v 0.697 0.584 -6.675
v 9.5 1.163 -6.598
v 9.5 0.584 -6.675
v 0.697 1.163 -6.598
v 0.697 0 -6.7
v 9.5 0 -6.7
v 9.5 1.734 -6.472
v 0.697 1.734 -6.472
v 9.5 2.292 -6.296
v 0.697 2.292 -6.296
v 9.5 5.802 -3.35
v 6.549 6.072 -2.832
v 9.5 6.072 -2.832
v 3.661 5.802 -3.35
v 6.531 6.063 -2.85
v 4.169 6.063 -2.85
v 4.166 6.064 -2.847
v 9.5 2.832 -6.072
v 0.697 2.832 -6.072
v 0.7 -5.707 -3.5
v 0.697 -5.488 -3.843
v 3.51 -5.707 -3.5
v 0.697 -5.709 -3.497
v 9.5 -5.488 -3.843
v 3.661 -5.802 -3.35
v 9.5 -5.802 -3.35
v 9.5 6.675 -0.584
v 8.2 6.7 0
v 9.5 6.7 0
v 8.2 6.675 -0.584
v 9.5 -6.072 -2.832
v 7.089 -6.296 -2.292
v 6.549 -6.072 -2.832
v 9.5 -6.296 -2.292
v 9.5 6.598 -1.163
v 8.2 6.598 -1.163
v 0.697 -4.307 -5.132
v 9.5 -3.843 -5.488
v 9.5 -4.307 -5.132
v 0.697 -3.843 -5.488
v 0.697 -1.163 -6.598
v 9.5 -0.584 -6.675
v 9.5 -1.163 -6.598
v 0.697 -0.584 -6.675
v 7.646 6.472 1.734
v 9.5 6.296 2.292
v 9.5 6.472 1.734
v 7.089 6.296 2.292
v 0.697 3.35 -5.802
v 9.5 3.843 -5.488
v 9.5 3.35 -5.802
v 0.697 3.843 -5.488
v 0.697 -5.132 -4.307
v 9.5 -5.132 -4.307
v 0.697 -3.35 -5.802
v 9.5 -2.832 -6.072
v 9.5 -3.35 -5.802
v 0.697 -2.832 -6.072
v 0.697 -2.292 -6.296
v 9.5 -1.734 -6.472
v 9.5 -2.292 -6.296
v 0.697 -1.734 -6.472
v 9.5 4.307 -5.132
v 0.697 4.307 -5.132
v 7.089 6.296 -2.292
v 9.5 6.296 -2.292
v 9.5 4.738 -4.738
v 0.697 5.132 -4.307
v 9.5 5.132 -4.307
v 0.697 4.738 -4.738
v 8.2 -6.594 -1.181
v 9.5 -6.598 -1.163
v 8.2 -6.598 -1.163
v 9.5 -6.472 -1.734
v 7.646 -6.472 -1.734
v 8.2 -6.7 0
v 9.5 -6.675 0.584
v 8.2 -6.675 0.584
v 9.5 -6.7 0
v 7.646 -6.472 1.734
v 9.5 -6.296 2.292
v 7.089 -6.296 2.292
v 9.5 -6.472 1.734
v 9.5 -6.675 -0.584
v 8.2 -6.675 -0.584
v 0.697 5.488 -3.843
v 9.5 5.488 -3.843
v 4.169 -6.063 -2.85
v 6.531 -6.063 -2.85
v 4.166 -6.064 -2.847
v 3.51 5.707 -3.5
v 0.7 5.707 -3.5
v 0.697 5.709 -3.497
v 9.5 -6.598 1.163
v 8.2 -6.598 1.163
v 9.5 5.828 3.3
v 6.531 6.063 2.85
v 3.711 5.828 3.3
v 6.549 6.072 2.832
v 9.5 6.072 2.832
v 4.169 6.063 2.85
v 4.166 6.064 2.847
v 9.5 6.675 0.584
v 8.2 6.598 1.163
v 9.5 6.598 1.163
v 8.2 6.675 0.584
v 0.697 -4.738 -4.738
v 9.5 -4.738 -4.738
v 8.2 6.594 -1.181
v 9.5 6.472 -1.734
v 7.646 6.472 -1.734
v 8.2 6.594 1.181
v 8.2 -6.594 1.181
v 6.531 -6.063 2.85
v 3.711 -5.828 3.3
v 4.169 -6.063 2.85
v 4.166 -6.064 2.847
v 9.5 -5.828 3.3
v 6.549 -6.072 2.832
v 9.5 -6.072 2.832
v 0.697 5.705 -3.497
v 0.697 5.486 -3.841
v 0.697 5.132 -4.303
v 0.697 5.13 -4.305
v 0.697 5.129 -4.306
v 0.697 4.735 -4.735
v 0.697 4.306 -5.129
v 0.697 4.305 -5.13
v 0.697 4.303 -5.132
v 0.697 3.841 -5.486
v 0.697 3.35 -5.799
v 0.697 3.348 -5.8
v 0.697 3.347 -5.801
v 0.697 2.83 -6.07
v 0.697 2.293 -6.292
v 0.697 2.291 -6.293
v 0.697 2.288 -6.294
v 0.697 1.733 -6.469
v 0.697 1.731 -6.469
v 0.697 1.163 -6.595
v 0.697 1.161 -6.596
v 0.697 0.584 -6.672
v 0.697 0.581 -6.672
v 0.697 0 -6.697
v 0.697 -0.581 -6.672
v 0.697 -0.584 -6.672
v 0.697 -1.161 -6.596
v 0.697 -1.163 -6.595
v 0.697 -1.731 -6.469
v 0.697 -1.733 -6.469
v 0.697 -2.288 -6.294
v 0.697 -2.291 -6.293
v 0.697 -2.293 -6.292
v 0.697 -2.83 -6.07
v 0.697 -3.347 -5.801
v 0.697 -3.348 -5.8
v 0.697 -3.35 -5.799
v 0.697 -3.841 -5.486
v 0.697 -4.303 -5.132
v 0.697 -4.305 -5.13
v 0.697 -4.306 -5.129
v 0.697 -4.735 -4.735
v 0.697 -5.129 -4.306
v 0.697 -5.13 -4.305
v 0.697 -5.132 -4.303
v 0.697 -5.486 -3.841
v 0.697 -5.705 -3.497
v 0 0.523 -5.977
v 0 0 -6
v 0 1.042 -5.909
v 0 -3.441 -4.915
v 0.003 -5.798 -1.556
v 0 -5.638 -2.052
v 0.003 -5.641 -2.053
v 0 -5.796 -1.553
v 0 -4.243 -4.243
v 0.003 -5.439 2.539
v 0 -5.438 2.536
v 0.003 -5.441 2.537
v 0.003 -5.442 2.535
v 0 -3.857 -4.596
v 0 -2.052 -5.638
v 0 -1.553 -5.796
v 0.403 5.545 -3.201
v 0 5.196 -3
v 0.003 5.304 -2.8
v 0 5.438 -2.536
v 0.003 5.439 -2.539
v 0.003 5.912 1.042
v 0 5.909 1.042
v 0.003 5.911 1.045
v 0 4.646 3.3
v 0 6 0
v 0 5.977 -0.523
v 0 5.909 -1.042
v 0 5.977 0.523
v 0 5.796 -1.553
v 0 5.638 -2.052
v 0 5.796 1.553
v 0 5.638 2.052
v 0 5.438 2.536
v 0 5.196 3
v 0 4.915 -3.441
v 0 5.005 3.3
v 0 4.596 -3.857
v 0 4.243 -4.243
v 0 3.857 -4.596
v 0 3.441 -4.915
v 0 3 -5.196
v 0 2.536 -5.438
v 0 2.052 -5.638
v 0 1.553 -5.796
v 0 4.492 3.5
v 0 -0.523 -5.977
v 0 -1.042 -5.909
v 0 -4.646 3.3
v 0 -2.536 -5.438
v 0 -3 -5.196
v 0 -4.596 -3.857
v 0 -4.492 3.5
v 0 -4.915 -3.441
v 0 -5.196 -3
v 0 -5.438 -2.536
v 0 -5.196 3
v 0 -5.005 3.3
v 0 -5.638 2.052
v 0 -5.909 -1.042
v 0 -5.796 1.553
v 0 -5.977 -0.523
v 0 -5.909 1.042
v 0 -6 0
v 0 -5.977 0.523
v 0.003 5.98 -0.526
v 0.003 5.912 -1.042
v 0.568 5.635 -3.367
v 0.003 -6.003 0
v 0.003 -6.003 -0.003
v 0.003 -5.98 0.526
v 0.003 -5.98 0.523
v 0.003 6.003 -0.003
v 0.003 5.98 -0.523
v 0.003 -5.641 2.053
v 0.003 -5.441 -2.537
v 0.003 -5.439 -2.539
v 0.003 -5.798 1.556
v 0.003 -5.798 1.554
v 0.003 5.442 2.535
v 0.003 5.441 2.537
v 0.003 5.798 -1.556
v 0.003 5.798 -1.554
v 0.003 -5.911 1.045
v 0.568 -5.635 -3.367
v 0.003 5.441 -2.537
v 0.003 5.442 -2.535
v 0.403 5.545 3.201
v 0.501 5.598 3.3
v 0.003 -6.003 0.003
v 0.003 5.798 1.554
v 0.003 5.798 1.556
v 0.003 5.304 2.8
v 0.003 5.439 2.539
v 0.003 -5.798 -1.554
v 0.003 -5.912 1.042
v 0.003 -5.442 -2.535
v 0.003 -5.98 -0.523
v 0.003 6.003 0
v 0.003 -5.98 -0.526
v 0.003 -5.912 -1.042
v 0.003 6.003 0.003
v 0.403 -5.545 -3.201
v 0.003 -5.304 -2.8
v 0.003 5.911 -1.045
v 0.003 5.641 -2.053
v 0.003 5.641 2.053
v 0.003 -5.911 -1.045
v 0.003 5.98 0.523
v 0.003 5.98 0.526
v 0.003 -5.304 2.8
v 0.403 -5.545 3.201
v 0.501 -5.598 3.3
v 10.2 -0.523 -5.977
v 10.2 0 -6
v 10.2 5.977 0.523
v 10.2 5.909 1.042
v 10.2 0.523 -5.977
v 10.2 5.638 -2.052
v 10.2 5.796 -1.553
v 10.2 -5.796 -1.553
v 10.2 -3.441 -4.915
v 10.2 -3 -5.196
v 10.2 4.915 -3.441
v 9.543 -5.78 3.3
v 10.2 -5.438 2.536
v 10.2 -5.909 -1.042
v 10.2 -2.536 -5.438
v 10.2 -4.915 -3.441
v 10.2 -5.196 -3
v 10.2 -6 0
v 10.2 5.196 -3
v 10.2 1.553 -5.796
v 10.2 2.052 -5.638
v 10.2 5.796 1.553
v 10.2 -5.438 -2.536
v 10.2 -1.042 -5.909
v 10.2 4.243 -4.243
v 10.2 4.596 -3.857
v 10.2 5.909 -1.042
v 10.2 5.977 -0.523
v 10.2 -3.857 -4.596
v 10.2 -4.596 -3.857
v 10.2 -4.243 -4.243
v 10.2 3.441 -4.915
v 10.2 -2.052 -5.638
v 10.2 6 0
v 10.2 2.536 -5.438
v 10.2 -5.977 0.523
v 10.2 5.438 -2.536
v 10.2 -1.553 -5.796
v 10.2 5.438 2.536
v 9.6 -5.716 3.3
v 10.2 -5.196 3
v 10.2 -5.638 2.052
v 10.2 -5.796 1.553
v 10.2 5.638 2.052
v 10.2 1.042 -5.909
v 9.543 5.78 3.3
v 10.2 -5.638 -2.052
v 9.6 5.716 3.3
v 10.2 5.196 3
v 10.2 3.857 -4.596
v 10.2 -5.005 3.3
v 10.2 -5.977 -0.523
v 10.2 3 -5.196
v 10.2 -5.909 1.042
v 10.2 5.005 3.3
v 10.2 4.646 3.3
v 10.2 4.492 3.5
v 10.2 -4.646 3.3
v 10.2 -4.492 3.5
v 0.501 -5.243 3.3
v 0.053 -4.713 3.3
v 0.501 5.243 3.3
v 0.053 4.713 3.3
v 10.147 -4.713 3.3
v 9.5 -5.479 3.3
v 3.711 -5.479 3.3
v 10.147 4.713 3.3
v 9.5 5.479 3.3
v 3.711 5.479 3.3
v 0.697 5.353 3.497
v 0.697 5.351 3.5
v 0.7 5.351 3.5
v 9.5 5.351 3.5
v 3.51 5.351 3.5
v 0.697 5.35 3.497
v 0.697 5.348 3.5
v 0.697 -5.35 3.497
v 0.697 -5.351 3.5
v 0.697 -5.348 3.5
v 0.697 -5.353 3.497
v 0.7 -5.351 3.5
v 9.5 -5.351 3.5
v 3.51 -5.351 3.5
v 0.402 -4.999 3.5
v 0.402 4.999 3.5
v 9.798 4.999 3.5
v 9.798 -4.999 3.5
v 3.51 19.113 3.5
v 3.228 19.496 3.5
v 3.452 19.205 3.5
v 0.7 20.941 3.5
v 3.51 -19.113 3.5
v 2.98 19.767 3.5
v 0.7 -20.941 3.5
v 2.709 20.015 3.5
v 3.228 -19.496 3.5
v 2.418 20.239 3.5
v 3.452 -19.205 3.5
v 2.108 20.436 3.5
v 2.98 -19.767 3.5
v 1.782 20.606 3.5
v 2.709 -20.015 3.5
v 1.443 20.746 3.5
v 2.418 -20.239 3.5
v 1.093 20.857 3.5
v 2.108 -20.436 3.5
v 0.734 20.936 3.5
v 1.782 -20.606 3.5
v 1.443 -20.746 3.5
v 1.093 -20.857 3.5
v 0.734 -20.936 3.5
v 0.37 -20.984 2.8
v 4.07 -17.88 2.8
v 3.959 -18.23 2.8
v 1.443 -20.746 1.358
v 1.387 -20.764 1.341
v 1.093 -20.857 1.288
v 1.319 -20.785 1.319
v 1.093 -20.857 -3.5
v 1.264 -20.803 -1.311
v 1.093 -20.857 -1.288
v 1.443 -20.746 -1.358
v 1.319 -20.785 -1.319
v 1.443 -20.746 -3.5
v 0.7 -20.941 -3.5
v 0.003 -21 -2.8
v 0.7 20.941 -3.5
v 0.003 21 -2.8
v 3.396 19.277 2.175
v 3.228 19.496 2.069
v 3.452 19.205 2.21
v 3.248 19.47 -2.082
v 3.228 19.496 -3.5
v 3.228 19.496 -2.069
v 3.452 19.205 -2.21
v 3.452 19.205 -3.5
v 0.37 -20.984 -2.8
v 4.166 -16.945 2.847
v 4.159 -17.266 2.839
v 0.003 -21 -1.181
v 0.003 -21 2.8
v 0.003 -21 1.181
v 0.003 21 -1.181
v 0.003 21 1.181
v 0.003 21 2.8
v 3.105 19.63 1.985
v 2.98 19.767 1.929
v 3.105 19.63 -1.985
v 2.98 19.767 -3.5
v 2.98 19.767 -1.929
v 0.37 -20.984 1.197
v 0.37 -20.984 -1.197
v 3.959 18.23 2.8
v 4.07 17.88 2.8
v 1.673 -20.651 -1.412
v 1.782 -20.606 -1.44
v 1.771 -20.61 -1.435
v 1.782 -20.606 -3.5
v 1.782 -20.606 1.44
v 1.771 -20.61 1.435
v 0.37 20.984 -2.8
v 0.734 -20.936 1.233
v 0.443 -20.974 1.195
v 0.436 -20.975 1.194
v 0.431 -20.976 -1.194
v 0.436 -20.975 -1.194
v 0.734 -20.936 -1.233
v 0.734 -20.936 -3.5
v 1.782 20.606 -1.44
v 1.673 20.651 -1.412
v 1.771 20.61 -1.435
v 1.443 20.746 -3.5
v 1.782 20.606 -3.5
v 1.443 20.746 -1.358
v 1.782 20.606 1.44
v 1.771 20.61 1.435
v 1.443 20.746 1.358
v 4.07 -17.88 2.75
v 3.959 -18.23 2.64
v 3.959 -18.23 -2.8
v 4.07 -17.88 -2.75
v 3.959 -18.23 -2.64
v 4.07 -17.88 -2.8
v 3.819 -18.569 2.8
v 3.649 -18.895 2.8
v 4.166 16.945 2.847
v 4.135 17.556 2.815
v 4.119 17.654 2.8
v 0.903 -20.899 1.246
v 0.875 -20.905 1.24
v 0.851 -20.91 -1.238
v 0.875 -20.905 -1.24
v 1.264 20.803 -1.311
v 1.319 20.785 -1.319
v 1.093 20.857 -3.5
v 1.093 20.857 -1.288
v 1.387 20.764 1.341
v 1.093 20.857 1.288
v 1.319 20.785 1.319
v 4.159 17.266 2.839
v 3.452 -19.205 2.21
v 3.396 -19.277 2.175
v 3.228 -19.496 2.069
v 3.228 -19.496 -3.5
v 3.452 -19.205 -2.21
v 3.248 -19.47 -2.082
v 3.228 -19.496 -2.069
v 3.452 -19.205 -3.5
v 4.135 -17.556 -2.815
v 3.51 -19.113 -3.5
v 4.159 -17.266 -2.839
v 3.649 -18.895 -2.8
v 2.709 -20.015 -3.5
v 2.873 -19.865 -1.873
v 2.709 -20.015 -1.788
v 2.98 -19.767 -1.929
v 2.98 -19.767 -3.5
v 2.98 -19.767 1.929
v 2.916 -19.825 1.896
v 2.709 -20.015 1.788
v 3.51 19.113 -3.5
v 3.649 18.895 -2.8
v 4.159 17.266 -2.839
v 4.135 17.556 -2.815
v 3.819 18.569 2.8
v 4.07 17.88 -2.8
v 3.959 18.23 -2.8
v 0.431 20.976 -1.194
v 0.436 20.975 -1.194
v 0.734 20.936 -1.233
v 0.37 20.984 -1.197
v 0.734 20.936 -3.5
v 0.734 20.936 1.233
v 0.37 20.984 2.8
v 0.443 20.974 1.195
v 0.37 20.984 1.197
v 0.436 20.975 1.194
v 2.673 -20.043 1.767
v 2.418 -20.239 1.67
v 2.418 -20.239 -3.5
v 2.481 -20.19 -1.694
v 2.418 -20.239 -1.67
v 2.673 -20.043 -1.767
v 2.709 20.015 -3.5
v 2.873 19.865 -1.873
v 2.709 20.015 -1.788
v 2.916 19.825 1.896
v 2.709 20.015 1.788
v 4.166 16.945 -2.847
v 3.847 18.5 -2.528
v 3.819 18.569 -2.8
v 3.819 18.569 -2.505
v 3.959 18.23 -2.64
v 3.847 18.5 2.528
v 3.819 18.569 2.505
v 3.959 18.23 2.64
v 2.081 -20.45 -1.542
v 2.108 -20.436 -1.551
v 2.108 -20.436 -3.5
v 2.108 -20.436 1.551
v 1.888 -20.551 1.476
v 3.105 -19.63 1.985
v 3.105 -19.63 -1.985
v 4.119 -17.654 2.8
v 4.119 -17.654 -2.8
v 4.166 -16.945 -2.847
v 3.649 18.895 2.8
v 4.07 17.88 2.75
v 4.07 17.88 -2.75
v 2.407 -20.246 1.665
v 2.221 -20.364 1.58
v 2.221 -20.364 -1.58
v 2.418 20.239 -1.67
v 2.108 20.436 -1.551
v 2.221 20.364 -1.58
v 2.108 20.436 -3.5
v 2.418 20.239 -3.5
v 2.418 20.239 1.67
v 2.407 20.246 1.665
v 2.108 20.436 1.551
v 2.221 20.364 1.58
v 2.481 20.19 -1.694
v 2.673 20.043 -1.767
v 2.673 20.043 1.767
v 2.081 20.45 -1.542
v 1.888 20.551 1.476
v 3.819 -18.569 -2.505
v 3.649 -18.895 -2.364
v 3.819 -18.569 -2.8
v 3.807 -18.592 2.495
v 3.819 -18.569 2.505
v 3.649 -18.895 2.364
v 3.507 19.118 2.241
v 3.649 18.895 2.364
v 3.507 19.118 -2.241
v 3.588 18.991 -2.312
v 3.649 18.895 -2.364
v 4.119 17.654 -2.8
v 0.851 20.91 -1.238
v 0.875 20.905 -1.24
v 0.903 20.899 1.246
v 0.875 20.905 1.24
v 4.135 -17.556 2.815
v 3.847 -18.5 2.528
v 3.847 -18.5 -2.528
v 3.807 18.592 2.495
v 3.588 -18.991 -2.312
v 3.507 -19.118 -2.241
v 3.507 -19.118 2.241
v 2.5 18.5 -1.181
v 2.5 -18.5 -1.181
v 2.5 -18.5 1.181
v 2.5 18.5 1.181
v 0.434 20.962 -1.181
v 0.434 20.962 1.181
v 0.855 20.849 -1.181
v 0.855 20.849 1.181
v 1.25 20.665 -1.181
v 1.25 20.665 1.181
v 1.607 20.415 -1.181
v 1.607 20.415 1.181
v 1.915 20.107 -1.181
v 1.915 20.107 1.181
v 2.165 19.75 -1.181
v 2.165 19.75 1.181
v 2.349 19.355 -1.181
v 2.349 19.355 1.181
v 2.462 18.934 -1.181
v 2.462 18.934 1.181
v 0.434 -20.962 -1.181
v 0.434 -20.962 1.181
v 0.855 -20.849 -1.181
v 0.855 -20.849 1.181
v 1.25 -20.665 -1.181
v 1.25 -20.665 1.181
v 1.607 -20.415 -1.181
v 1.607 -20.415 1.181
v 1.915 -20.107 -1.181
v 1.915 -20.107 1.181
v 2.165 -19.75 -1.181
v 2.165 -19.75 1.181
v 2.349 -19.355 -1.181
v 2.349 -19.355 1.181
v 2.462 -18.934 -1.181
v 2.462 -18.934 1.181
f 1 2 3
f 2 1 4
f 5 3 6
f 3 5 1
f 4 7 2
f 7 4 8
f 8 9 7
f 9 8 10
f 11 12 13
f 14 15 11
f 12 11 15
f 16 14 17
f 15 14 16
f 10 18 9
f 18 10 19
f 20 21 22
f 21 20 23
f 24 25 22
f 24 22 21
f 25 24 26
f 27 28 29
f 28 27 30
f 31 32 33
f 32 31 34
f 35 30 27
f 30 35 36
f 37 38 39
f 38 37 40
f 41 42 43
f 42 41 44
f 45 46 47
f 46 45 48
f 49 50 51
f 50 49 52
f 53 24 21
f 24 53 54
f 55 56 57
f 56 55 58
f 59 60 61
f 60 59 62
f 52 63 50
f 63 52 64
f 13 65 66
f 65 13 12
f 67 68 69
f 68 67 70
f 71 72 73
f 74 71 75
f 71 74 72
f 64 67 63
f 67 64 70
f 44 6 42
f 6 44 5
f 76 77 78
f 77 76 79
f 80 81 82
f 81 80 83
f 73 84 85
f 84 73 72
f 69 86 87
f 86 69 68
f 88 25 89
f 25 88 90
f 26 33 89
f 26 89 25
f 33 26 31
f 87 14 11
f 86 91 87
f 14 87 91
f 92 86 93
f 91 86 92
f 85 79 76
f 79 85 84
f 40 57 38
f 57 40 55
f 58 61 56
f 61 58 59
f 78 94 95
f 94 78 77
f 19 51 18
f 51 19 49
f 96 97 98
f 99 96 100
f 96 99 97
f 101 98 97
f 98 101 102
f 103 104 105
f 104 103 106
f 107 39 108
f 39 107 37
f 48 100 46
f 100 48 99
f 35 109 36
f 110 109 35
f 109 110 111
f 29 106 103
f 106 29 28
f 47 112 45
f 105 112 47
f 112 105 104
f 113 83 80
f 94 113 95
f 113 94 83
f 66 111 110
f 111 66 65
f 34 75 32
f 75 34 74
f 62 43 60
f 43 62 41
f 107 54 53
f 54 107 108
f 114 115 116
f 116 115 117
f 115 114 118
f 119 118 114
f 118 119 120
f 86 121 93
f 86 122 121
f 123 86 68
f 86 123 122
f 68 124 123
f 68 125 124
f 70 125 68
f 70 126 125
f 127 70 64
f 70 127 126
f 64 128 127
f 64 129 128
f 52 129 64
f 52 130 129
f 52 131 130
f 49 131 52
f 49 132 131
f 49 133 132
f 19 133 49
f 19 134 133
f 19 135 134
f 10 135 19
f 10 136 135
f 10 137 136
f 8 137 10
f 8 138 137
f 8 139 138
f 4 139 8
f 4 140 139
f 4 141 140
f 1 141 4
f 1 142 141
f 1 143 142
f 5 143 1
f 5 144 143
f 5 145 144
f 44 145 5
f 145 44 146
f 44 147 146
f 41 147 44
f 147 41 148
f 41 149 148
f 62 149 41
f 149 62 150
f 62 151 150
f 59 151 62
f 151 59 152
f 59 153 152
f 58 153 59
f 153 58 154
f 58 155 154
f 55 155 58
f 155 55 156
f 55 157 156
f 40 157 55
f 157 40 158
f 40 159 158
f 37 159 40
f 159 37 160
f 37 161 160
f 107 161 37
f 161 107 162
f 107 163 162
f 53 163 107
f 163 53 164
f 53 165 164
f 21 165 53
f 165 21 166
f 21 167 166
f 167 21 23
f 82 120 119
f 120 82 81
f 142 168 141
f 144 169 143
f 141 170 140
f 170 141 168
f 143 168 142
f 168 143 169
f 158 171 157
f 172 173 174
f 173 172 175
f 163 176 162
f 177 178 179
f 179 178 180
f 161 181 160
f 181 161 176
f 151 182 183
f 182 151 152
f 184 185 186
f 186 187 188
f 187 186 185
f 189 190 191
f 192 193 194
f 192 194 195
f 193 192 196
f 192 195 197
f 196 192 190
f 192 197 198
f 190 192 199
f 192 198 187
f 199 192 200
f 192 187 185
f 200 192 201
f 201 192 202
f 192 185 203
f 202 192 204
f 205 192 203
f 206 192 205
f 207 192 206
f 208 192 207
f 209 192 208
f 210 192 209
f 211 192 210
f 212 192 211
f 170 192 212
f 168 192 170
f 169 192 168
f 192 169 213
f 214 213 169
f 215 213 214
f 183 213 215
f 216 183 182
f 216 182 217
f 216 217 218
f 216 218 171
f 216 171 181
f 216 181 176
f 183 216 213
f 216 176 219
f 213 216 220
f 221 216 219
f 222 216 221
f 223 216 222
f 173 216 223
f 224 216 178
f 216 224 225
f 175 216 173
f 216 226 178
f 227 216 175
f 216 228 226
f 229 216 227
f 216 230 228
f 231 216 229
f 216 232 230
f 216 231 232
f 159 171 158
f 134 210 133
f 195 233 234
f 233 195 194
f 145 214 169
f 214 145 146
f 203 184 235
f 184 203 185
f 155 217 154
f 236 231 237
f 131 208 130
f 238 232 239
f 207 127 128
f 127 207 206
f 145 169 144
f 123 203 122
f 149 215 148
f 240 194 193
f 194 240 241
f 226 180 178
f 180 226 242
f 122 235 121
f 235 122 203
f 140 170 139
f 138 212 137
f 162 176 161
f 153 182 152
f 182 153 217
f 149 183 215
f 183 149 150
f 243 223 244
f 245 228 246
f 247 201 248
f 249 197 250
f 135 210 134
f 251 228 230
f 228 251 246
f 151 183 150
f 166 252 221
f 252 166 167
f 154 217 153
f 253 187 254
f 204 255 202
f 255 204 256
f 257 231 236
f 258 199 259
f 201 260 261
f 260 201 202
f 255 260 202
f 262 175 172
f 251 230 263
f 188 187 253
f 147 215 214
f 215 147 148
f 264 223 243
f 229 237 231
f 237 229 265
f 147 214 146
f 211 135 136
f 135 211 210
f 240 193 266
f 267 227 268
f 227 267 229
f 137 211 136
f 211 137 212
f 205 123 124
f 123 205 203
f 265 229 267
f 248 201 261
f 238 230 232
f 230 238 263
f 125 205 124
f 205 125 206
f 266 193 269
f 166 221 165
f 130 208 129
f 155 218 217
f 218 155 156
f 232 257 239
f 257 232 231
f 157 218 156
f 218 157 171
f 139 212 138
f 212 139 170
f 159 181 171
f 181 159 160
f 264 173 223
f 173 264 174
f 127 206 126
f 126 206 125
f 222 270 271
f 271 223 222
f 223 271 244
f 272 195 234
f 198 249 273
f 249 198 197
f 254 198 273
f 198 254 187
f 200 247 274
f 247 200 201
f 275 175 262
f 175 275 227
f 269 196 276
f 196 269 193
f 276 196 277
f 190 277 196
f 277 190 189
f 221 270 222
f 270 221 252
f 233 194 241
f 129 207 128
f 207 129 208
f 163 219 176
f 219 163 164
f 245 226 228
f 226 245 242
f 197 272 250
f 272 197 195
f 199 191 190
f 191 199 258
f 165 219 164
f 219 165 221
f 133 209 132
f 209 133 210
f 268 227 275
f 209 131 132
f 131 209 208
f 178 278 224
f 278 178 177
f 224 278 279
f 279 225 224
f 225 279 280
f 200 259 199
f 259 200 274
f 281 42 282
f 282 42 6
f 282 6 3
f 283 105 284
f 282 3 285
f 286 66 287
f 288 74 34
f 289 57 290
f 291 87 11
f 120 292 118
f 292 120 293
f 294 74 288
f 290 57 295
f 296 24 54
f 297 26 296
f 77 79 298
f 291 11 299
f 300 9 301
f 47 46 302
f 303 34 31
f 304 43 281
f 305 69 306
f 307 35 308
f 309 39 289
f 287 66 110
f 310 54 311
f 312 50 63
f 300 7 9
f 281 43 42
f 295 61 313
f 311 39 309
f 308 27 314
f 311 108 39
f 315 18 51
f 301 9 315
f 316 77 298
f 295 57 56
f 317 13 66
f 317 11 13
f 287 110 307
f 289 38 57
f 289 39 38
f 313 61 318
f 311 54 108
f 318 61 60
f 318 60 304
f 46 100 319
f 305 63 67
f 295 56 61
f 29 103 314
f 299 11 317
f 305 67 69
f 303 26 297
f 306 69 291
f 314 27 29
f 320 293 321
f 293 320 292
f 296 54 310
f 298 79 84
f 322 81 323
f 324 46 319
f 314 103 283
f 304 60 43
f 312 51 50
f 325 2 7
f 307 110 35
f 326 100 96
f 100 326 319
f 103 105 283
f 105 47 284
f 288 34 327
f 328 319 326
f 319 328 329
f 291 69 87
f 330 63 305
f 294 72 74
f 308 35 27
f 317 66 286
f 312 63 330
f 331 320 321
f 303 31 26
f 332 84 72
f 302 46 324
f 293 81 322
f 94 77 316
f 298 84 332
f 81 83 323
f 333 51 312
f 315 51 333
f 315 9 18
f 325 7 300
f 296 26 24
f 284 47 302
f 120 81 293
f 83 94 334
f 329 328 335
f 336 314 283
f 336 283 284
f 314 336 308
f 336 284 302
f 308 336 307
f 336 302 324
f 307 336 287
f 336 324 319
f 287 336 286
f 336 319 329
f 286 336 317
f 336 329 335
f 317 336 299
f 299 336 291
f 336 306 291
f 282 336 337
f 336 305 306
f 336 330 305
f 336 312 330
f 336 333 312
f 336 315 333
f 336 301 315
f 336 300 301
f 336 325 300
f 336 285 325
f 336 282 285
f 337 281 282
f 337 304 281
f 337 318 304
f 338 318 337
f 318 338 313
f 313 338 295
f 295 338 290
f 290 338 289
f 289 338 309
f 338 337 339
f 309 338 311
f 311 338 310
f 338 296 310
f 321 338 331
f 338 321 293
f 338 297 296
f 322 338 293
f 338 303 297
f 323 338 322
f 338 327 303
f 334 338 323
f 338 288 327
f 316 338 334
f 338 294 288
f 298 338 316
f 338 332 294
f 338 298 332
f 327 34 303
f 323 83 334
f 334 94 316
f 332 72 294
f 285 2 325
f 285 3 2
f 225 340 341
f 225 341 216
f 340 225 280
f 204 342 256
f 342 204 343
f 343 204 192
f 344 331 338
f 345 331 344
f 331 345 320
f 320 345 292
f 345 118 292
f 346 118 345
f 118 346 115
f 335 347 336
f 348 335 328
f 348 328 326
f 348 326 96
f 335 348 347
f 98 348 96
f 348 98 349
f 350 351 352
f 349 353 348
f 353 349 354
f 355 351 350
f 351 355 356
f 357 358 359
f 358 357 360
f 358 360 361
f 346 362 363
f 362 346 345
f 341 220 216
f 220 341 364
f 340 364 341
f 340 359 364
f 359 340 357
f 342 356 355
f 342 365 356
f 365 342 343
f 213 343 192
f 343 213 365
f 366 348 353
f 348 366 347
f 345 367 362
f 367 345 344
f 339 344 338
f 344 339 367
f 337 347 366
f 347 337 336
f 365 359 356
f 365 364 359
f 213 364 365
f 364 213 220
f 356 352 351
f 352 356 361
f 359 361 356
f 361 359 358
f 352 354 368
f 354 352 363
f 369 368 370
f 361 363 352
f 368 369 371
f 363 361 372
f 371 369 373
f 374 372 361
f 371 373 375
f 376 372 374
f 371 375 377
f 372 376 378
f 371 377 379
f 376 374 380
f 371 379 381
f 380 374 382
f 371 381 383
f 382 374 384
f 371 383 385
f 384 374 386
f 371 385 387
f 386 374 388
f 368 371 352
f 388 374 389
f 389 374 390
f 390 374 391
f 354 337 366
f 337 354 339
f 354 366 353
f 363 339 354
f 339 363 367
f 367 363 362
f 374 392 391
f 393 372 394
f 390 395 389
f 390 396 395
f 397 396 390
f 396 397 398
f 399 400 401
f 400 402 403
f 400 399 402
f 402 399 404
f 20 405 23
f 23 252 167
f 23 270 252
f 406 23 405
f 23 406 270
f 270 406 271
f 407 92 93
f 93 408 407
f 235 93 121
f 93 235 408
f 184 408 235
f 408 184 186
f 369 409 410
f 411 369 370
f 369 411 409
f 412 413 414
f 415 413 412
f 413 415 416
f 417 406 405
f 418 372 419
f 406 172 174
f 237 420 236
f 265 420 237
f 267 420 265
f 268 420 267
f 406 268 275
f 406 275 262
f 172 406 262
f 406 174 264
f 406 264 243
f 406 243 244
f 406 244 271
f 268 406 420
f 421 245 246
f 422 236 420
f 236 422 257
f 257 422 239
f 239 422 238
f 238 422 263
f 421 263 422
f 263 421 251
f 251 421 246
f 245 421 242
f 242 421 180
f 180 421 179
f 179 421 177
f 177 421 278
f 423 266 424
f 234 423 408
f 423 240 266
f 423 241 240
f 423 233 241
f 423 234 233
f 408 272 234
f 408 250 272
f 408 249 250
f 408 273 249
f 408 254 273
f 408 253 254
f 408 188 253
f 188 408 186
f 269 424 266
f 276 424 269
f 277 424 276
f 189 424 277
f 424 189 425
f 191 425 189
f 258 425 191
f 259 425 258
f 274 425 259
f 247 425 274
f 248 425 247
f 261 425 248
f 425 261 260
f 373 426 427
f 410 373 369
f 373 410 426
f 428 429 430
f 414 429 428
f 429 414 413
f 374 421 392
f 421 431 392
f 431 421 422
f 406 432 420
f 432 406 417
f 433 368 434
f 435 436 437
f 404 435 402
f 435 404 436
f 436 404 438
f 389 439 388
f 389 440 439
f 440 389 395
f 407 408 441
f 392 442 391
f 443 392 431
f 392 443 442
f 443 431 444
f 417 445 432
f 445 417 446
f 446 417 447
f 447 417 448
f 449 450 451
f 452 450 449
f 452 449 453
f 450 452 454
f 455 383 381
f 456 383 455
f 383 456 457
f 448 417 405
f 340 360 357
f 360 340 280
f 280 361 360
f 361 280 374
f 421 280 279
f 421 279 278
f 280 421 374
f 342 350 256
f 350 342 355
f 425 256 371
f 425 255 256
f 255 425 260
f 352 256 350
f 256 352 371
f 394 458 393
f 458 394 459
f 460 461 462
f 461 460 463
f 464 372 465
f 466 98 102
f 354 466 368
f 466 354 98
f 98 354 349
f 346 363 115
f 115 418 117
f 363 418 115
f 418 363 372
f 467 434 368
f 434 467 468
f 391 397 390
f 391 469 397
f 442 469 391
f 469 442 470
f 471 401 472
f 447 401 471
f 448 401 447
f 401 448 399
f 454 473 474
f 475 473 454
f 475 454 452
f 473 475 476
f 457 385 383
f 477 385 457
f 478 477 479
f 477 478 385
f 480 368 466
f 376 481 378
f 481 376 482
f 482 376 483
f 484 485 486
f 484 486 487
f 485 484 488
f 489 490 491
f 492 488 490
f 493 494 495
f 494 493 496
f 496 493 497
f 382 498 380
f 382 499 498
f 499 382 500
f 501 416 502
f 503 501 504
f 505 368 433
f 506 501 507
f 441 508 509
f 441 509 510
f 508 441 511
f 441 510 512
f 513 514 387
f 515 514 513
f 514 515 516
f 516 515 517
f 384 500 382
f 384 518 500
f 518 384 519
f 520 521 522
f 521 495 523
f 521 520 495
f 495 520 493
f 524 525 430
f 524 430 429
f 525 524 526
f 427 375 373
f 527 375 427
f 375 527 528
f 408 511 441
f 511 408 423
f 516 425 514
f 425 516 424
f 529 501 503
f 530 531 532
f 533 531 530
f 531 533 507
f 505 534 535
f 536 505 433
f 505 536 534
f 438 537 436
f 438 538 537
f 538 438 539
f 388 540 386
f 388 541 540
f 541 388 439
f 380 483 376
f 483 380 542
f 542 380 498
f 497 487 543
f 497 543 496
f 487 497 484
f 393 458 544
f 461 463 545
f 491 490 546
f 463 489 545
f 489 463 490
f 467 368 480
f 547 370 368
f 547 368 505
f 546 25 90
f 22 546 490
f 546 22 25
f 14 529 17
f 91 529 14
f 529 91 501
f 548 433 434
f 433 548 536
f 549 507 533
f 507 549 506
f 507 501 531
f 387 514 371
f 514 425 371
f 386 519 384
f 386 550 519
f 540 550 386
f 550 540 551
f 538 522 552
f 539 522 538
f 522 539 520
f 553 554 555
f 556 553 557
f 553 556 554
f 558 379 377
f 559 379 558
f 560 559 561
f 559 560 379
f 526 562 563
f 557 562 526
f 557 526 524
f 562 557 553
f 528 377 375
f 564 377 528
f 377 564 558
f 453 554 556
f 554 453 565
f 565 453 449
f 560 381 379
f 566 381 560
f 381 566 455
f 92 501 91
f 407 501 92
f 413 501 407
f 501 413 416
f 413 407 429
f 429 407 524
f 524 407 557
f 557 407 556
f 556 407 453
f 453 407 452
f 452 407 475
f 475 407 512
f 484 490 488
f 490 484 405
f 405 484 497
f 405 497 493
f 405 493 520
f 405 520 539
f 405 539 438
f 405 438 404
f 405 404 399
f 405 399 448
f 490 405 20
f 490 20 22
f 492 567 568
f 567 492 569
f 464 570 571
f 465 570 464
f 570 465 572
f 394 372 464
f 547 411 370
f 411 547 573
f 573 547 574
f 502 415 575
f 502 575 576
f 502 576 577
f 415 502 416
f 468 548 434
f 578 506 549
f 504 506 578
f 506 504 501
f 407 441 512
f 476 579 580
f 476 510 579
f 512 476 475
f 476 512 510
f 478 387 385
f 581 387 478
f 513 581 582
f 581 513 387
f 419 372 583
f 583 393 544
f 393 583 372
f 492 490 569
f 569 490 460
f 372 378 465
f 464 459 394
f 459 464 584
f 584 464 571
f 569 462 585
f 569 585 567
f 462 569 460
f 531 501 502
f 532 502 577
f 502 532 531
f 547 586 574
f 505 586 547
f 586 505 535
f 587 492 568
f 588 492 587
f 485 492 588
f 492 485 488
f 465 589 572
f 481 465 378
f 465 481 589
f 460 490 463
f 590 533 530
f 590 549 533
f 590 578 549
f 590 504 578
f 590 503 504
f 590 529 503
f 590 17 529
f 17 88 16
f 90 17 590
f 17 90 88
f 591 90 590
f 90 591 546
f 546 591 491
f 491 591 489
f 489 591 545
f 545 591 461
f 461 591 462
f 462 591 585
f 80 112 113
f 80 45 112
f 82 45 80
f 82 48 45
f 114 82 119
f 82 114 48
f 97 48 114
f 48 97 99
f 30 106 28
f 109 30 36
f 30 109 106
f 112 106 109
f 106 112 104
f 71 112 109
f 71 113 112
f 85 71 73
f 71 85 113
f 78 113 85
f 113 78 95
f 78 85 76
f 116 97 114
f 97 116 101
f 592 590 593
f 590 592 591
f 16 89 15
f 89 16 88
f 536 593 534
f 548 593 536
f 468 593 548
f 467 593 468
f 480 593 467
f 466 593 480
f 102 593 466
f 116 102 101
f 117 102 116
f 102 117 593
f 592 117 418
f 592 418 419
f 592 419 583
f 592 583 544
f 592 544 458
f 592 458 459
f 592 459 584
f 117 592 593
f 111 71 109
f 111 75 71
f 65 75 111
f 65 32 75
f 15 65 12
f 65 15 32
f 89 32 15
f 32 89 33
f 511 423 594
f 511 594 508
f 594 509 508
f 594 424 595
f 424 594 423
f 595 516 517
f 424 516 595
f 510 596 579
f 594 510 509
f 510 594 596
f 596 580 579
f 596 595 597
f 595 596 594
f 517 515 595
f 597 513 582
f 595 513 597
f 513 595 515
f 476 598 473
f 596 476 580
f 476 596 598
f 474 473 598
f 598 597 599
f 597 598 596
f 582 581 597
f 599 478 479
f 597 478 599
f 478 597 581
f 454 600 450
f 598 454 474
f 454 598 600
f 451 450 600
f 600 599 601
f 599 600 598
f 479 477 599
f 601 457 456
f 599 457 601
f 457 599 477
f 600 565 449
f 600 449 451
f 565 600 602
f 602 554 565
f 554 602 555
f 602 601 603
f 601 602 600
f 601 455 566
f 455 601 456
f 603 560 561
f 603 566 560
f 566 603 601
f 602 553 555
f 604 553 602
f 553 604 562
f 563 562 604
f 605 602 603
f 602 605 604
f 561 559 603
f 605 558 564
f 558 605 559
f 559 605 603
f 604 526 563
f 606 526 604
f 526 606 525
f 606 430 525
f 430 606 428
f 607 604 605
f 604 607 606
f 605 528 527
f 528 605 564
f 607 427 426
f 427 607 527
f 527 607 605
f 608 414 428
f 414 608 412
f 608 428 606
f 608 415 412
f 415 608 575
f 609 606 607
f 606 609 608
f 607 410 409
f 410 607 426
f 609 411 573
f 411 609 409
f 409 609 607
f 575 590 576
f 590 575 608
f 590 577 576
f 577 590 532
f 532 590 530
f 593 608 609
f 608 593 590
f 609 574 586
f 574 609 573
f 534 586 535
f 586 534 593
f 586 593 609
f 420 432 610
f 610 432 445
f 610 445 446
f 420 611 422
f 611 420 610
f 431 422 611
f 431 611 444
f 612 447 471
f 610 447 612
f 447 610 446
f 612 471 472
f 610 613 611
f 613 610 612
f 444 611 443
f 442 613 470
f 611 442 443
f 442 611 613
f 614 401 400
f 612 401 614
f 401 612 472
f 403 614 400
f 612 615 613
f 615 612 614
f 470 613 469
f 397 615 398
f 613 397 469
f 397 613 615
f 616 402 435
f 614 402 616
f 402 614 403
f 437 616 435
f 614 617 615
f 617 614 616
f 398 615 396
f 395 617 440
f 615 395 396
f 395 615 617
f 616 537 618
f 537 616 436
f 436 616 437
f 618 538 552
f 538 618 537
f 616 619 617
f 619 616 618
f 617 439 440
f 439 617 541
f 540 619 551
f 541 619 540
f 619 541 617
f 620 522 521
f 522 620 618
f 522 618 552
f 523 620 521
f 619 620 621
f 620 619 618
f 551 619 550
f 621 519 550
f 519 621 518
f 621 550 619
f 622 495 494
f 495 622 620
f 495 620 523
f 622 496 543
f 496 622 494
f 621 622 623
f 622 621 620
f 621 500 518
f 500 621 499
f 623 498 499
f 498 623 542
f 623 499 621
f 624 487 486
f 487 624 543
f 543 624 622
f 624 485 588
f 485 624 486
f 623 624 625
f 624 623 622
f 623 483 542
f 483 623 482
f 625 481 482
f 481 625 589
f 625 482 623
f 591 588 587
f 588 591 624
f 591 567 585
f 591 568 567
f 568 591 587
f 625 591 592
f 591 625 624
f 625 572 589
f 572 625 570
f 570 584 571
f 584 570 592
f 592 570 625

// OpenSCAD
// file: ../morph.scad
// Utilities for composing smooth solids from a list of cross-sections.

// Searches over a list of key/value pairs (sorted by key), returning
// the index of the pair with the largest key less than or equal to 'target'.
function _binsearch(target, pairs) = (
  _binsearch_impl(target, pairs, 0, len(pairs))
);
function _binsearch_impl(target, pairs, lo, hi) = (
  // Base case.
  hi == lo + 1 ? lo :
  // Recursive case.
  let (mid = floor((hi + lo) / 2))
  pairs[mid][0] <= target
  ? _binsearch_impl(target, pairs, mid, hi)
  : _binsearch_impl(target, pairs, lo, mid)
);

// Filters out slices which do not affect the resulting solid.
function _filter(slices) = (
  assert(len(slices) > 0, "No slices")
  let (last = len(slices)-1)
  [
    for (i = [0 : last]) if (
      // Always keep the start and end.
      i == 0 ||
      i == last ||
      // Keep interior slices only if they are not bordered on both sides by
      // identical slices.
      slices[i-1][1] != slices[i][1] ||
      slices[i+1][1] != slices[i][1]
    ) slices[i]
  ]
);
  
// Each element of 'slices' is a pair giving a Z-coordinate and a payload
// list of values. The result is a similar list with Z-coordinates spaced
// apart by $zstep and the payload values interpolated.
function _reslice(slices) = (
  assert(len(slices) > 0, "No slices")
  let (
    last = len(slices)-1,
    minz = slices[0][0],
    maxz = slices[last][0]
  )
  [
    for (z = [minz : $zstep : maxz]) (
      // Edge cases: No interpolation.
      z == minz ? [z, slices[0][1]] :
      z == maxz ? [z, slices[last][1]] :
    
      // Load the two bounding points between which to interpolate.
      let (
        lo = _binsearch(z, slices),
    
        lower_z = slices[lo][0],
        lower_payload = slices[lo][1],
        upper_z = slices[lo+1][0],
        upper_payload = slices[lo+1][1],
    
        // Interpolation ratio.
        r = (z - lower_z) / (upper_z - lower_z)
      )
      [z, upper_payload*r + lower_payload*(1-r)]
    )
  ]
);

// Interpolates between several slices in the z dimension. Each element of
// 'slices' is a pair giving a Z-coordinate and a payload list of values.
// $zstep determines the resolution. The children are expected to be 2-D.
// They are evaluated repeatedly to produces the slices of the morphed
// solid. Each time the children are evaluated, $m will contain an interpolated
// slice.
module morph(slices) {
  layers = _filter(_reslice(slices));
    
  // We intentionally throw out the last slice. Otherwise we would extrude
  // one zstep beyond the desired dimensions.
  last = len(layers)-2;
  
  for (i = [0 : last]) {
    z = layers[i][0];
    height = layers[i+1][0] - z;
    translate([0, 0, z]) {
      // Add 1% to make sure all of the layers actually overlap.
      linear_extrude(height * 1.01) {
        $m = layers[i][1];
        children();
      }
    }
  }
}

// A utility for generating slices to be passed to morph. This allows the
// z-coordinate to be used as one of the interpolated elements.
function dupfirst(slices) = [
  for (s = slices) [s[0], s]
];
// file: ../extrude_and_chamfer.scad
// Like linear_extrude, but chamfers the bottom and/or top. Chamfering
// the bottom can counter elephant's foot.
module extrude_and_chamfer(height, bottom_chamfer=0, top_chamfer=0) {
  // Chamfered bottom.
  hull() {
    linear_extrude(0.0001)
      offset(delta=-bottom_chamfer)
        children();
    translate([0, 0, abs(bottom_chamfer)])
      linear_extrude(0.0001)
        children();
  }
  
  // Main body.
  hull() {
    translate([0, 0, abs(bottom_chamfer)])
      linear_extrude(0.0001)
        children();
    translate([0, 0, height-abs(top_chamfer)])
      linear_extrude(0.0001)
        children();
  }
  
  // Chamfered top.
  hull() {
    translate([0, 0, height-abs(top_chamfer)])
      linear_extrude(0.0001)
        children();
    translate([0, 0, height])
      linear_extrude(0.0001)
        offset(delta=-top_chamfer)
          children();
  }
}
// file: rail.scad
include <common.scad>

rail_notch_depth = 2.5;
rail_notch_length = 4;

// lug_type:
//   0 means no lug.
//   -1 means no lug and slightly recessed further.
//   1 means beveled.
//   2 means square.
module rail_2d(width, stem, lug_type) {
  translate([0, -stem/2 - 0.2, 0])
    square([width, stem - 0.4], center=true);
  
  difference() {
    hull()
      for (a = [-1, 1])
        scale([a, 1, 1])
          translate([width/2, 0, 0])
            rotate([0, 0, 45])
              square(rail_notch_depth*sqrt(2), center=true);
    
    // Square off the ends, to avoid sharp corners.
    for (a = [-1, 1])
      scale([a, 1, 1])
        translate([width/2 + rail_notch_depth, 0, 0])
          square(1, center=true);

    if (lug_type <= 0)
      translate([0, rail_notch_depth - (lug_type == -1 ? 0.4 : 0)])
        square([width+rail_notch_depth*4, rail_notch_depth*2], center=true);
  }
  
  if (lug_type == 2)
    translate([0, rail_notch_depth/2, 0])
      square([width + rail_notch_depth*2 - 1, rail_notch_depth], center=true);
}

module rail(width, length, stem, cavity=false) {
  repeats = floor(length / (2*rail_notch_length));
  
  intersection() {
    cube([width*2, width*2, length*2], center=true);
    
    for (a = [0:repeats]) {
      translate([0, 0, a*2*rail_notch_length]) {
        difference() {
          // High piece.
          translate([0, 0, cavity ? -snug/2 : 0])
            linear_extrude(rail_notch_length+eps + (cavity ? snug : 0))
              offset(cavity ? snug : 0)
                rail_2d(width, stem, cavity ? 2 : 1);

          // Chamfer edges.
          if (!cavity)
            for (z = [0, rail_notch_length])
              translate([0, rail_notch_depth, z])
                hull()
                  rotate([45, 0, 0])
                    cube(
                      [width*2, foot*sqrt(2), foot*sqrt(2)],
                      center=true
                    );
        }

        // Low piece.
        translate([0, 0, rail_notch_length])
          linear_extrude(rail_notch_length+eps)
            offset(cavity ? snug : 0)
              // When not cutting out a cavity, recess the low piece a bit
              // to make up for printing inaccuracies while bridging.
              rail_2d(width, stem, cavity ? 0 : -1);      
      }
    }
  }
}
// file: common.scad
$fa = 10;
$fs = 0.2;
eps = 0.003;
$zstep = 0.2;

// An inward chamfer sufficient to prevent elephant's foot.
foot = 0.4;

// FINDINGS FROM CLEARANCE TEST
//
// Consider a vertical hole of width X, a layer height of 0.2, and a vertical
// post.
//   * A post of diameter X will not fit in.
//   * A post of diameter X-0.1 will fit in, but is very hard to slide in or out.
//     This is probably due mostly to the transverse grain of the print.
//     It will rotate, but with some resistance.
//   * A post of diameter X-0.2 slides in and out easily. It rotates easily, but
//     still has noticeable resistance at some points.
//   * A post of diameter X-0.3 rotates freely. It also has noticeable play
//     from side to side.
//
// Clearances are expressed as the total across both sides of a joint.
tight = 0.1;  // Intended for stationary joints.
snug = 0.2;   // Moves, but with some resistance.
loose = 0.3;  // Free movement.
extra_loose = 0.4;

// A brim is a 0.2mm layer printed near an edge which is likely to warp.
// The edge should be chamfered outwards at 45 degrees. The brim should
// be placed this far from the bottom of the edge, so it barely touches
// the chamfer.
brim_offset = 0.3;

// Menards 5/8 x 2-3/4 x 0.04 WG compression spring.
spring_od = 5/8 * 25.4;
// Subtract 10 from the relaxed length so everything is slightly tensioned
// all the time.
spring_max_length = 2.75 * 25.4 - 10;
spring_min_length = 16;  // Approximate.

// Menards 1/4 inch aluminum rod.
roller_diameter = 6.7;
roller_cavity_diameter = roller_diameter + loose;

// 550 paracord. Make this wide enough to accommodate a melted end.
string_diameter = 4.5;

// Standard spring tube.
tube_id = spring_od + 0.7;

module octagon(diameter) {
  intersection_for(a = [0, 45])
    rotate([0, 0, a])
      square(diameter, center=true);
}

// A cylinder with chamfered or flared ends, useful for dealing with
// elephant's foot on pins or holes.
module flare_cylinder(height, radius, flare_top, flare_bottom) {
  translate([0, 0, abs(flare_bottom)-eps])
    cylinder(height-abs(flare_bottom)-abs(flare_top)+eps, radius, radius);

  // Bottom flare.
  linear_extrude(abs(flare_bottom), scale=radius/(radius-flare_bottom))
    circle(radius-flare_bottom);
  
  // Top flare.
  translate([0, 0, height-abs(flare_top)])
    linear_extrude(abs(flare_top), scale=(radius-flare_top)/radius)
      circle(radius);
}

// A cube with a chamfered or flared bottom end, useful for dealing
// with elephant's foot on pins or holes.
module flare_cube(dims, flare) {
  translate([0, 0, abs(flare)-eps])
    cube([dims.x, dims.y, dims.z - abs(flare) + eps]);

  translate([dims.x/2, dims.y/2, 0])
    linear_extrude(abs(flare), scale=[dims.x/(dims.x-2*flare), dims.y/(dims.y-2*flare)])
      translate([-(dims.x-2*flare)/2, -(dims.y-2*flare)/2, abs(flare)-eps])
        square([dims.x-2*flare, dims.y-2*flare]);
}

// An approximate circle which can be printed on its side.
module circle_ish(r) {
  // Safe overhang angle.
  q = 45;
  
  intersection() {
    // Add 0.2 (one print layer) in case the bridge is messy and hangs
    // down.
    square(2*r+0.2, center=true);
    hull() {
      circle(r);
      for (a = [-1, 1])
        translate([0, a*r/cos(q), 0])
          square(eps, center=true);
    }
  }
}

// Depth of the sockets used as glue aids.
socket_depth = 5;

module socket() {
  translate([-1.5, -1.5, -eps])
    flare_cube([3, 3, socket_depth], -foot);
}

module lug() {
  flare_cube([3-snug, 3-snug, 2*socket_depth-2], foot);
}

// Nerf darts are 0.50 cal.
dart_diameter = 12.7;
dart_length = 72;

module octahedron(major_radius=1) {
  // Top and bottom halves.
  for (a = [-1, 1])
    scale([1, 1, a])
      // Extrude a square into a pyramid.
      linear_extrude(major_radius, scale=0)
        rotate([0, 0, 45])
          square(sqrt(2)*major_radius, center=true);
}

module chamfered_cube(dims, chamfer=1) {
  assert(dims.x >= 2*chamfer);
  assert(dims.y >= 2*chamfer);
  assert(dims.z >= 2*chamfer);

  hull()
    for (a = [0, 1], b = [0, 1], c = [0, 1])
        translate([
          (dims.x - 2*chamfer) * a + chamfer,
          (dims.y - 2*chamfer) * b + chamfer,
          (dims.z - 2*chamfer) * c + chamfer
        ])
          octahedron(chamfer);
}
// main file
include <common.scad>
include <rail.scad>
include <../extrude_and_chamfer.scad>
include <../morph.scad>

cam_lip = 1.25;
cam_thickness = string_diameter + 2*cam_lip;
cam_cavity_diameter = cam_thickness + extra_loose;
cam_diameter = 18;
cam_length = 45;

cleat_diameter = 7;
cleat_offset = cam_diameter/2;

module cam_2d(cleat_recess=true) {
  // The back of the cam, which has a simple shape and faces away
  // from you.
  difference() {
    hull() {
      intersection() {
        for (x = [0, cam_length - cam_diameter])
          translate([x, 0, 0])
            circle(d=cam_diameter);
        translate([-cam_diameter/2, -cam_length, 0])
          square(cam_length);
      }
    }
    
    if (cleat_recess)
      // Cutout to make it easy to thread the string through the cleat.
      translate([cleat_offset, -cam_diameter/2 - cleat_diameter*0.3, 0])
        circle(d=cleat_diameter*1.2);
  }
  
  // The front of the cam, which has a gradual increase in radius (like
  // most cams).
  polygon([
    for (a = [0 : 1/40 : 1])
      (cam_diameter/2 + (1-cos(a * 90)) * (cam_length - cam_diameter))
      * [-cos(a*180), sin(a*180)]
  ]);
}

string_groove_depth = string_diameter*0.4;

module make_cam_exterior() {
  // The cam is a delicate piece; morph it with high precision.
  $zstep = 0.1;

  // Exterior, with an octagonal groove for the string.
  morph([
    [0, [foot]],
    [foot, [0]],
    [cam_lip, [0]],
    [cam_lip + string_groove_depth, [string_groove_depth]],
    [cam_thickness - cam_lip - string_groove_depth, [string_groove_depth]],
    [cam_thickness - cam_lip, [0]],
    [cam_thickness, [0]],
  ])
    offset(-$m[0])
      children();
}

module cam() {
  difference() {
    union() {
      make_cam_exterior()
        cam_2d();
    
      // Cleat.
      translate([cleat_offset, -cam_diameter/2-cleat_diameter/2, 0]) {
        make_cam_exterior()
          circle(d=cleat_diameter);
      
        // Plates joining cleat to cam.
        translate([-cleat_diameter/2, 0, 0])
          flare_cube([cleat_diameter, cleat_diameter, cam_lip], foot);
        translate([-cleat_diameter/2, 0, cam_thickness - cam_lip])
          cube([cleat_diameter, cleat_diameter, cam_lip], foot);
      }
    }
        
    // Hole for roller. Add $zstep/2 since the cam might be slightly
    // thicker than requested (due to morph).
    translate([0, 0, -eps])
      extrude_and_chamfer(cam_thickness + 2*eps + $zstep/2, -foot, -0.2)
        circle(d=roller_diameter+loose);
  }
}

// Need beefy tubes because they have fewer reinforcing struts.
tube_wall = 5;

// Extension of roller into walls at its ends.
roller_end = 3;

// Make the tubes slightly closer.
tube_nudge = 3;

limb_diameter = tube_id + 2*tube_wall;
limb_breadth = 2*tube_id + 4*tube_wall + cam_cavity_diameter + 2*roller_end - 2*tube_nudge;

roller_cavity_length = limb_breadth - 2*tube_wall;

follower_finger_width = 10;

// Ensure sufficient thickness even on the bottom, where there is a cutout for
// the follower finger.
limb_base_thickness = follower_finger_width + 2.5;

// Cross-section of the limb.
module limb_2d(
  cam_cavity=false,
  spring_cavity=false,
  roller_cavity=false,
  barrel_cavity=false
) {
  difference() {
    // Exterior.
    hull()
      for (a = [-1, 1])
        translate([a*(limb_diameter-limb_breadth)/2, 0, 0])
          circle(d=limb_diameter);
      
    if (cam_cavity) {
      square([cam_cavity_diameter, limb_diameter+2*eps], center=true);
        
      // Slightly chamfer the edge of the gap.
      translate([0, limb_diameter/2, 0])
        rotate([0, 0, 45])
          square(cam_cavity_diameter/sqrt(2)+1, center=true);
    }
    
    if (spring_cavity) {
      for (a = [-1, 1])
        translate([a*(tube_id/2 + tube_wall + cam_cavity_diameter/2 - tube_nudge), 0, 0])
          circle(d=tube_id);
    }
    
    if (roller_cavity) {
      square([roller_cavity_length, roller_cavity_diameter], center=true);
    }
    
    if (barrel_cavity) {
      square([barrel_height+tight, limb_diameter+2*eps], center=true);
    }
    
    // We always cut out a slot for the string and follower when they are in the rest
    // position. This is only on the side of the limb that faces you.
    translate([0, -limb_diameter/2, 0])
      square([cam_cavity_diameter, limb_diameter+2*eps], center=true);

    // Slightly chamfer the edge of the gap.
    translate([0, -limb_diameter/2, 0])
      rotate([0, 0, 45])
        square(cam_cavity_diameter/sqrt(2)+1, center=true);
  }
}

// With these cams we probably don't need to push the spring all 
// the way.
effective_spring_min_length = spring_min_length + 2;

// Should be wide enough to accommodate whatever bore structure we
// want.
barrel_width = 20;
barrel_height = 34;

module limb() {
  // A smooth inner tube helps accommodate the spring.
  $fa = 5;

  // How far beyond the roller does the cam extend? Add 1 for safe
  // clearance at the bottom of the limb.
  cam_overhang = 1 + (cam_diameter - roller_diameter) / 2;

  // Add a generous 10mm of extra length to make it easier to assemble.
  // In the final version we can make this shorter, but for now we 
  // want to experiment with different points on the spring's curve.
  tube_inner_length = spring_max_length + roller_diameter + 10;
  
  difference() {
    union() {
      translate([0, 0, -barrel_width/2])
        linear_extrude(limb_base_thickness + barrel_width/2)
          limb_2d();
      
      translate([0, 0, limb_base_thickness])
        linear_extrude(effective_spring_min_length - cam_overhang)
          limb_2d(spring_cavity=true);
      
      translate([0, 0, limb_base_thickness + effective_spring_min_length - cam_overhang])
        linear_extrude(cam_overhang)
          limb_2d(spring_cavity=true, cam_cavity=true);
      
      translate([0, 0, limb_base_thickness + effective_spring_min_length])
        linear_extrude(tube_inner_length - effective_spring_min_length - foot)
          limb_2d(spring_cavity=true, cam_cavity=true, roller_cavity=true);
      
      // Foot on top (bottom, when printing).
      translate([0, 0, limb_base_thickness + tube_inner_length]) {
        translate([0, 0, -foot])
          linear_extrude(foot/2)
            offset(-foot/2)
              limb_2d(spring_cavity=true, cam_cavity=true, roller_cavity=true);
        translate([0, 0, -foot/2])
          linear_extrude(foot/2)
            offset(-foot)
              limb_2d(spring_cavity=true, cam_cavity=true, roller_cavity=true);
      }
            
      // Fillet in front for a strong attachment to the barrel.
      extra_width = 12;
      fillet_width = extra_width + barrel_height;
      fillet_length = 20;
      translate([-fillet_width/2, limb_diameter/2-2, 0]) {
        hull() {
          translate([0, 0, limb_base_thickness + effective_spring_min_length - cam_overhang]) {
            translate([0, 0, -4])
              cube([fillet_width, eps, eps]);
            translate([fillet_width/2-cam_cavity_diameter/2, 2, 0])
              cube([cam_cavity_diameter, eps, eps]);
          }
          translate([0, 0, -barrel_width/2])
            cube([fillet_width, fillet_length, eps]);
          translate([0, 0, 7-barrel_width/2])
            cube([fillet_width, fillet_length, eps]);
        }
      }
    }
  
    // String channel inside the fillet.
    tunnel_id = string_diameter + 1.7;
    tunnel_curve_radius = 5;
    translate([
      0,
      tunnel_curve_radius + limb_diameter/2 - 1.5,
      limb_base_thickness + effective_spring_min_length - cam_overhang
    ]) {      
      translate([0, 0, eps])
        rotate([180, 90, 0])
          rotate_extrude(angle=90)
            translate([tunnel_curve_radius + tunnel_id/2, 0, 0])
              octagon(tunnel_id);
      translate([tunnel_curve_radius + tunnel_id/2, -eps, -tunnel_curve_radius - tunnel_id/2])    
        rotate([0, 180, 0])
          rotate_extrude(angle=90)
            translate([tunnel_curve_radius + tunnel_id/2, 0, 0])
              octagon(tunnel_id);
      
      // Etch the top of the tunnel so that it prints better when inverted
      // (as bridging is needed).
      translate([0, -tunnel_curve_radius - tunnel_id/2 + 0.15, 0]) {
        hull() {
          translate([0, 0, -2])
            linear_extrude(eps)
              octagon(tunnel_id);

          linear_extrude(eps)
            square(cam_cavity_diameter, center=true);
        }
      }
    }
    
    // Similarly steeple the bridges over the rod cavity, to get neat printing.
    translate([0, 0, limb_base_thickness + effective_spring_min_length])
      rotate([45, 0, 0])
        cube([roller_cavity_length-eps, cam_cavity_diameter/sqrt(2), cam_cavity_diameter/sqrt(2)], center=true);

    // Rail cavities.
    cavity_length = rail_notch_length*17;
    // Slide the cavities away slightly so that the limbs don't quite meet each
    // other. This ensures a tight fit on the barrel.
    extra_space = 0.25;
    for (a = [-1, 1])
      scale([a, 1, 1])
        translate([-barrel_height/2, -cavity_length/2, -barrel_width/2 - extra_space])
          rotate([0, 90, 90])
            rail(barrel_width, cavity_length, barrel_height/2 - cam_cavity_diameter/2, cavity=true);
    
    // Limit the intrusion of the middle lug between the two barrel pieces.
    translate([-barrel_height/4, 0, -barrel_width-1.2])
      cube([barrel_height/2, 40, barrel_width]);
    
    // Completely remove one quarter of the base to allow free movement of the
    // forend where it grabs the follower.
    translate([-cam_cavity_diameter/2, 0, -barrel_width])
      linear_extrude(barrel_width+follower_finger_width+loose)
        polygon([
          [limb_breadth, 0],
          [23, 0],
          [13, 10],
          [0, 10],
          [0, -limb_diameter],
          [limb_breadth, -limb_diameter],
        ]);

    // Passage for zip tie. My medium zip ties have a cross section of 1.2x3.5mm.
    // This is slightly offset forward, since we must cut out some of the limb
    // on the bottom to accommodate the slide.
    for (a = [-1, 1])
      scale([a, 1, 1])
        translate([limb_breadth/2-3.8, 4, -barrel_width/2])
          scale([1, 1, 2])
            rotate([90, 0, 0])
              rotate_extrude(angle = 360)
                translate([3.5, 0, 0])
                  square([2.2, 4], center=true);
  }
}

barrel_length = 244;
// See results from bore_test.scad.
main_bore = 13.8;

module barrel() {
  // Make the bore with high precision.
  $fa = 5;
  
  difference() {
    translate([0, barrel_height/2, 0])
      rail(barrel_width, barrel_length, barrel_height/2 - cam_cavity_diameter/2);
    
    translate([0, 0, -eps])
      cylinder(barrel_length+2*eps, d=main_bore);
  }
  
  // Brims to prevent warping.
  for (z = [-7 + 0.2, barrel_length - 0.2])
    translate([-barrel_width/2, -0.2 + barrel_height/2 + rail_notch_depth, z])
      cube([barrel_width, 0.2, 7]);
}

// The barrel needs a particular orientation on the build plate.
module barrel_print() {
  // This particular orientation ensures that the first bridging layer goes
  // the short way across the gaps, instead of the long way.
  rotate([-90, 0, -45])
    barrel();
}

follower_front_wall = 2.5;
follower_width = barrel_width + follower_finger_width*2 + 2;

module follower() {
  tunnel_id = string_diameter + 1.2;
  
  // Enough chamfer to absort the elephant foot and then some, for smooth movement.
  chamfer = 0.7;
  
  difference() {
    union() {
      // Front piece which passes through the slots.
      outer_radius = follower_front_wall + tunnel_id*0.3;
      hull() {
        for (a = [-1, 1]) {
          scale([1, a, 1]) {
            difference() {
              translate([eps, follower_width/2 - outer_radius, -cam_thickness/2])
                rotate_extrude(angle = 90)
                  square([outer_radius, cam_thickness]);
              
              // Chamfer leading and trailing edges.
              for (b = [-1, 1])
                scale([1, 1, b])
                  for (x = [0, outer_radius])
                    translate([x, 0, cam_thickness/2])
                      cube([chamfer*2, follower_width+2*eps, chamfer*2], center=true);
            }
          }
        }
      }
      
      // Piston shape which engages with the bottom bore, to keep the follower
      // straight. We have to instantiate it twice with different radii to prevent
      // elephant's foot.
      piston_length = tunnel_id + follower_front_wall + 2;
      $fa = 5;
      intersection() {
        rotate([0, 90, 0])
          flare_cylinder(piston_length, (main_bore-extra_loose)/2, chamfer, chamfer);
        translate([0, -main_bore/2, cam_thickness/2-main_bore-0.2])
          cube([piston_length+2*eps, main_bore, main_bore]);
      }
      intersection() {
        rotate([0, 90, 0])
          flare_cylinder(piston_length, (main_bore-extra_loose)/2-0.3, chamfer, chamfer);
        translate([0, -main_bore/2, cam_thickness/2-main_bore])
          cube([piston_length+2*eps, main_bore, main_bore]);
      }
    }
    
    // String tunnel.
    translate([tunnel_id/2 + follower_front_wall, 0, 0]) {
      for (a = [-1, 1]) {
        scale([1, a, 1]) {
          translate([0, eps, 0])
            rotate([90, 0, 0])
              linear_extrude(follower_width/2 - follower_front_wall + 2*eps)
                octagon(tunnel_id);
          
          translate([-follower_front_wall - tunnel_id/2, -follower_width/2 + follower_front_wall, 0])
            rotate([0, 0, -90])
              rotate_extrude(angle = 90)
                translate([follower_front_wall + tunnel_id/2, 0, 0])
                  octagon(tunnel_id);
        }
      }
    }
  }
}

follower();
